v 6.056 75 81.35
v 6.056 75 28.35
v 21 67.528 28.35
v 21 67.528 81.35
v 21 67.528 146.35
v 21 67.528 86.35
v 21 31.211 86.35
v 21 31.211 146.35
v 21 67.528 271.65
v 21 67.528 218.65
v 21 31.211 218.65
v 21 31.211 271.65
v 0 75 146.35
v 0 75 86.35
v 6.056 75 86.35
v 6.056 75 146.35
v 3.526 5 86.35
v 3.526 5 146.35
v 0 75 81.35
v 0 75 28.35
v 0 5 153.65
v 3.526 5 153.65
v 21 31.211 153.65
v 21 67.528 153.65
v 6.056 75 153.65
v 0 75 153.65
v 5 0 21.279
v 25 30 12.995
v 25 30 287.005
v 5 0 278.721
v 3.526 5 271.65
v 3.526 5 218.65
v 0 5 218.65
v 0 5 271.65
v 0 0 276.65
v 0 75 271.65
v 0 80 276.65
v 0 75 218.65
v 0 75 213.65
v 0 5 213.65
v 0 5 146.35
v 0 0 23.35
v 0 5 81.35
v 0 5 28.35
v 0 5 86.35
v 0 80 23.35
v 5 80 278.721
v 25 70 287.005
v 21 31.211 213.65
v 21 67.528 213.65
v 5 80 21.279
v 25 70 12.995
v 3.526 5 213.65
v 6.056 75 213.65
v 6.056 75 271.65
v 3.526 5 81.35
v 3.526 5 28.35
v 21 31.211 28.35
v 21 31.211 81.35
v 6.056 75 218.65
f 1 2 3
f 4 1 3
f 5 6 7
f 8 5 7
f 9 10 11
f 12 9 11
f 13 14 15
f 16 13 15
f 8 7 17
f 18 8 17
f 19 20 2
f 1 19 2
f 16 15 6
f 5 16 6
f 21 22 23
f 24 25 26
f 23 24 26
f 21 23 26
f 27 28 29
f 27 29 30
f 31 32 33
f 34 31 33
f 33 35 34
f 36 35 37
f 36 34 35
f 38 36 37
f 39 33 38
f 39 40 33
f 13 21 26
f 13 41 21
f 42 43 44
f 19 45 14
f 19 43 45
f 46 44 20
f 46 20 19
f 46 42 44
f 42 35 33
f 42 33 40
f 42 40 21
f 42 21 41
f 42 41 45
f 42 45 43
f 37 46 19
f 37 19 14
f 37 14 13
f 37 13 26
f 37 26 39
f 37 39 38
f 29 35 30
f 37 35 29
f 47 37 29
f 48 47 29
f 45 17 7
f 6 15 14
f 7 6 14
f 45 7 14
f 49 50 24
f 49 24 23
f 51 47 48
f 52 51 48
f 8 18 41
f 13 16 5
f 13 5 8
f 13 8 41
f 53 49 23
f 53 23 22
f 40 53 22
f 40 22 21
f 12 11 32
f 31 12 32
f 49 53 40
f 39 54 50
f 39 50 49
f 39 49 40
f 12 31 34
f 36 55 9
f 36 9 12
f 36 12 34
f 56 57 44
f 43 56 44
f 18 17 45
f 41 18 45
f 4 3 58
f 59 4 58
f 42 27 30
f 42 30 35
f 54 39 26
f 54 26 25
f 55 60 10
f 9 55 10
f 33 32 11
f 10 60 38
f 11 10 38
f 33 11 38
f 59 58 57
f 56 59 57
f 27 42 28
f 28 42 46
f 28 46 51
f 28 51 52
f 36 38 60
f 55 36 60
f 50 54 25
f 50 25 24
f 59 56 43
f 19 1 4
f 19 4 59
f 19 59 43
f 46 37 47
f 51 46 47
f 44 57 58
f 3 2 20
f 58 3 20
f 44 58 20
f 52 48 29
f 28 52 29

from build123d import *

# Parameters (mm, degrees)
EXTRUDE_1_DEPTH     = 300
CUT_EXTRUDE_1_DEPTH = 290
CUT_EXTRUDE_3_DEPTH = 53
CUT_EXTRUDE_4_DEPTH = 60
CUT_EXTRUDE_5_DEPTH = 53
CUT_EXTRUDE_6_DEPTH = 60


with BuildPart() as part:
    # 草图1 → 拉伸1 (new body)
    with BuildSketch(Plane.XY):
        Polygon((0, 0), (0, 80), (5, 80), (25, 70), (25, 30), (5, 0), align=None)
    extrude(amount=EXTRUDE_1_DEPTH)

    # 草图2 → 切除-拉伸1 (cut)
    with BuildSketch(Plane(origin=(0, 80, 0), x_dir=(-1, 0, 0), z_dir=(0, 1, 0))):
        Polygon((0, 276.65), (-136.816544737, 333.321268387), (0, 333.321268387), align=None)
        Polygon((0, 0), (0, 23.35), (-107.528203225, -21.189640114), (0, -21.189640114), align=None)
    extrude(amount=-CUT_EXTRUDE_1_DEPTH, mode=Mode.SUBTRACT)

    # 草图5 → 切除-拉伸3 (cut)
    with BuildSketch(Plane.XY.offset(28.35)):
        Polygon((0, 75), (6.05572809, 75), (21, 67.527864045), (21, 31.211102551), (3.525931633, 5), (0, 5), align=None)
    extrude(amount=CUT_EXTRUDE_3_DEPTH, mode=Mode.SUBTRACT)

    # 草图6 → 切除-拉伸4 (cut)
    with BuildSketch(Plane.XY.offset(86.35)):
        Polygon((0, 75), (6.05572809, 75), (21, 67.527864045), (21, 31.211102551), (3.525931633, 5), (0, 5), align=None)
    extrude(amount=CUT_EXTRUDE_4_DEPTH, mode=Mode.SUBTRACT)

    # 草图7 → 切除-拉伸5 (cut)
    with BuildSketch(Plane.XY.offset(218.65)):
        Polygon((0, 75), (6.05572809, 75), (21, 67.527864045), (21, 31.211102551), (3.525931633, 5), (0, 5), align=None)
    extrude(amount=CUT_EXTRUDE_5_DEPTH, mode=Mode.SUBTRACT)

    # 草图8 → 切除-拉伸6 (cut)
    with BuildSketch(Plane.XY.offset(213.65)):
        Polygon((0, 75), (6.05572809, 75), (21, 67.527864045), (21, 31.211102551), (3.525931633, 5), (0, 5), align=None)
    extrude(amount=-CUT_EXTRUDE_6_DEPTH, mode=Mode.SUBTRACT)


solid = part.part
